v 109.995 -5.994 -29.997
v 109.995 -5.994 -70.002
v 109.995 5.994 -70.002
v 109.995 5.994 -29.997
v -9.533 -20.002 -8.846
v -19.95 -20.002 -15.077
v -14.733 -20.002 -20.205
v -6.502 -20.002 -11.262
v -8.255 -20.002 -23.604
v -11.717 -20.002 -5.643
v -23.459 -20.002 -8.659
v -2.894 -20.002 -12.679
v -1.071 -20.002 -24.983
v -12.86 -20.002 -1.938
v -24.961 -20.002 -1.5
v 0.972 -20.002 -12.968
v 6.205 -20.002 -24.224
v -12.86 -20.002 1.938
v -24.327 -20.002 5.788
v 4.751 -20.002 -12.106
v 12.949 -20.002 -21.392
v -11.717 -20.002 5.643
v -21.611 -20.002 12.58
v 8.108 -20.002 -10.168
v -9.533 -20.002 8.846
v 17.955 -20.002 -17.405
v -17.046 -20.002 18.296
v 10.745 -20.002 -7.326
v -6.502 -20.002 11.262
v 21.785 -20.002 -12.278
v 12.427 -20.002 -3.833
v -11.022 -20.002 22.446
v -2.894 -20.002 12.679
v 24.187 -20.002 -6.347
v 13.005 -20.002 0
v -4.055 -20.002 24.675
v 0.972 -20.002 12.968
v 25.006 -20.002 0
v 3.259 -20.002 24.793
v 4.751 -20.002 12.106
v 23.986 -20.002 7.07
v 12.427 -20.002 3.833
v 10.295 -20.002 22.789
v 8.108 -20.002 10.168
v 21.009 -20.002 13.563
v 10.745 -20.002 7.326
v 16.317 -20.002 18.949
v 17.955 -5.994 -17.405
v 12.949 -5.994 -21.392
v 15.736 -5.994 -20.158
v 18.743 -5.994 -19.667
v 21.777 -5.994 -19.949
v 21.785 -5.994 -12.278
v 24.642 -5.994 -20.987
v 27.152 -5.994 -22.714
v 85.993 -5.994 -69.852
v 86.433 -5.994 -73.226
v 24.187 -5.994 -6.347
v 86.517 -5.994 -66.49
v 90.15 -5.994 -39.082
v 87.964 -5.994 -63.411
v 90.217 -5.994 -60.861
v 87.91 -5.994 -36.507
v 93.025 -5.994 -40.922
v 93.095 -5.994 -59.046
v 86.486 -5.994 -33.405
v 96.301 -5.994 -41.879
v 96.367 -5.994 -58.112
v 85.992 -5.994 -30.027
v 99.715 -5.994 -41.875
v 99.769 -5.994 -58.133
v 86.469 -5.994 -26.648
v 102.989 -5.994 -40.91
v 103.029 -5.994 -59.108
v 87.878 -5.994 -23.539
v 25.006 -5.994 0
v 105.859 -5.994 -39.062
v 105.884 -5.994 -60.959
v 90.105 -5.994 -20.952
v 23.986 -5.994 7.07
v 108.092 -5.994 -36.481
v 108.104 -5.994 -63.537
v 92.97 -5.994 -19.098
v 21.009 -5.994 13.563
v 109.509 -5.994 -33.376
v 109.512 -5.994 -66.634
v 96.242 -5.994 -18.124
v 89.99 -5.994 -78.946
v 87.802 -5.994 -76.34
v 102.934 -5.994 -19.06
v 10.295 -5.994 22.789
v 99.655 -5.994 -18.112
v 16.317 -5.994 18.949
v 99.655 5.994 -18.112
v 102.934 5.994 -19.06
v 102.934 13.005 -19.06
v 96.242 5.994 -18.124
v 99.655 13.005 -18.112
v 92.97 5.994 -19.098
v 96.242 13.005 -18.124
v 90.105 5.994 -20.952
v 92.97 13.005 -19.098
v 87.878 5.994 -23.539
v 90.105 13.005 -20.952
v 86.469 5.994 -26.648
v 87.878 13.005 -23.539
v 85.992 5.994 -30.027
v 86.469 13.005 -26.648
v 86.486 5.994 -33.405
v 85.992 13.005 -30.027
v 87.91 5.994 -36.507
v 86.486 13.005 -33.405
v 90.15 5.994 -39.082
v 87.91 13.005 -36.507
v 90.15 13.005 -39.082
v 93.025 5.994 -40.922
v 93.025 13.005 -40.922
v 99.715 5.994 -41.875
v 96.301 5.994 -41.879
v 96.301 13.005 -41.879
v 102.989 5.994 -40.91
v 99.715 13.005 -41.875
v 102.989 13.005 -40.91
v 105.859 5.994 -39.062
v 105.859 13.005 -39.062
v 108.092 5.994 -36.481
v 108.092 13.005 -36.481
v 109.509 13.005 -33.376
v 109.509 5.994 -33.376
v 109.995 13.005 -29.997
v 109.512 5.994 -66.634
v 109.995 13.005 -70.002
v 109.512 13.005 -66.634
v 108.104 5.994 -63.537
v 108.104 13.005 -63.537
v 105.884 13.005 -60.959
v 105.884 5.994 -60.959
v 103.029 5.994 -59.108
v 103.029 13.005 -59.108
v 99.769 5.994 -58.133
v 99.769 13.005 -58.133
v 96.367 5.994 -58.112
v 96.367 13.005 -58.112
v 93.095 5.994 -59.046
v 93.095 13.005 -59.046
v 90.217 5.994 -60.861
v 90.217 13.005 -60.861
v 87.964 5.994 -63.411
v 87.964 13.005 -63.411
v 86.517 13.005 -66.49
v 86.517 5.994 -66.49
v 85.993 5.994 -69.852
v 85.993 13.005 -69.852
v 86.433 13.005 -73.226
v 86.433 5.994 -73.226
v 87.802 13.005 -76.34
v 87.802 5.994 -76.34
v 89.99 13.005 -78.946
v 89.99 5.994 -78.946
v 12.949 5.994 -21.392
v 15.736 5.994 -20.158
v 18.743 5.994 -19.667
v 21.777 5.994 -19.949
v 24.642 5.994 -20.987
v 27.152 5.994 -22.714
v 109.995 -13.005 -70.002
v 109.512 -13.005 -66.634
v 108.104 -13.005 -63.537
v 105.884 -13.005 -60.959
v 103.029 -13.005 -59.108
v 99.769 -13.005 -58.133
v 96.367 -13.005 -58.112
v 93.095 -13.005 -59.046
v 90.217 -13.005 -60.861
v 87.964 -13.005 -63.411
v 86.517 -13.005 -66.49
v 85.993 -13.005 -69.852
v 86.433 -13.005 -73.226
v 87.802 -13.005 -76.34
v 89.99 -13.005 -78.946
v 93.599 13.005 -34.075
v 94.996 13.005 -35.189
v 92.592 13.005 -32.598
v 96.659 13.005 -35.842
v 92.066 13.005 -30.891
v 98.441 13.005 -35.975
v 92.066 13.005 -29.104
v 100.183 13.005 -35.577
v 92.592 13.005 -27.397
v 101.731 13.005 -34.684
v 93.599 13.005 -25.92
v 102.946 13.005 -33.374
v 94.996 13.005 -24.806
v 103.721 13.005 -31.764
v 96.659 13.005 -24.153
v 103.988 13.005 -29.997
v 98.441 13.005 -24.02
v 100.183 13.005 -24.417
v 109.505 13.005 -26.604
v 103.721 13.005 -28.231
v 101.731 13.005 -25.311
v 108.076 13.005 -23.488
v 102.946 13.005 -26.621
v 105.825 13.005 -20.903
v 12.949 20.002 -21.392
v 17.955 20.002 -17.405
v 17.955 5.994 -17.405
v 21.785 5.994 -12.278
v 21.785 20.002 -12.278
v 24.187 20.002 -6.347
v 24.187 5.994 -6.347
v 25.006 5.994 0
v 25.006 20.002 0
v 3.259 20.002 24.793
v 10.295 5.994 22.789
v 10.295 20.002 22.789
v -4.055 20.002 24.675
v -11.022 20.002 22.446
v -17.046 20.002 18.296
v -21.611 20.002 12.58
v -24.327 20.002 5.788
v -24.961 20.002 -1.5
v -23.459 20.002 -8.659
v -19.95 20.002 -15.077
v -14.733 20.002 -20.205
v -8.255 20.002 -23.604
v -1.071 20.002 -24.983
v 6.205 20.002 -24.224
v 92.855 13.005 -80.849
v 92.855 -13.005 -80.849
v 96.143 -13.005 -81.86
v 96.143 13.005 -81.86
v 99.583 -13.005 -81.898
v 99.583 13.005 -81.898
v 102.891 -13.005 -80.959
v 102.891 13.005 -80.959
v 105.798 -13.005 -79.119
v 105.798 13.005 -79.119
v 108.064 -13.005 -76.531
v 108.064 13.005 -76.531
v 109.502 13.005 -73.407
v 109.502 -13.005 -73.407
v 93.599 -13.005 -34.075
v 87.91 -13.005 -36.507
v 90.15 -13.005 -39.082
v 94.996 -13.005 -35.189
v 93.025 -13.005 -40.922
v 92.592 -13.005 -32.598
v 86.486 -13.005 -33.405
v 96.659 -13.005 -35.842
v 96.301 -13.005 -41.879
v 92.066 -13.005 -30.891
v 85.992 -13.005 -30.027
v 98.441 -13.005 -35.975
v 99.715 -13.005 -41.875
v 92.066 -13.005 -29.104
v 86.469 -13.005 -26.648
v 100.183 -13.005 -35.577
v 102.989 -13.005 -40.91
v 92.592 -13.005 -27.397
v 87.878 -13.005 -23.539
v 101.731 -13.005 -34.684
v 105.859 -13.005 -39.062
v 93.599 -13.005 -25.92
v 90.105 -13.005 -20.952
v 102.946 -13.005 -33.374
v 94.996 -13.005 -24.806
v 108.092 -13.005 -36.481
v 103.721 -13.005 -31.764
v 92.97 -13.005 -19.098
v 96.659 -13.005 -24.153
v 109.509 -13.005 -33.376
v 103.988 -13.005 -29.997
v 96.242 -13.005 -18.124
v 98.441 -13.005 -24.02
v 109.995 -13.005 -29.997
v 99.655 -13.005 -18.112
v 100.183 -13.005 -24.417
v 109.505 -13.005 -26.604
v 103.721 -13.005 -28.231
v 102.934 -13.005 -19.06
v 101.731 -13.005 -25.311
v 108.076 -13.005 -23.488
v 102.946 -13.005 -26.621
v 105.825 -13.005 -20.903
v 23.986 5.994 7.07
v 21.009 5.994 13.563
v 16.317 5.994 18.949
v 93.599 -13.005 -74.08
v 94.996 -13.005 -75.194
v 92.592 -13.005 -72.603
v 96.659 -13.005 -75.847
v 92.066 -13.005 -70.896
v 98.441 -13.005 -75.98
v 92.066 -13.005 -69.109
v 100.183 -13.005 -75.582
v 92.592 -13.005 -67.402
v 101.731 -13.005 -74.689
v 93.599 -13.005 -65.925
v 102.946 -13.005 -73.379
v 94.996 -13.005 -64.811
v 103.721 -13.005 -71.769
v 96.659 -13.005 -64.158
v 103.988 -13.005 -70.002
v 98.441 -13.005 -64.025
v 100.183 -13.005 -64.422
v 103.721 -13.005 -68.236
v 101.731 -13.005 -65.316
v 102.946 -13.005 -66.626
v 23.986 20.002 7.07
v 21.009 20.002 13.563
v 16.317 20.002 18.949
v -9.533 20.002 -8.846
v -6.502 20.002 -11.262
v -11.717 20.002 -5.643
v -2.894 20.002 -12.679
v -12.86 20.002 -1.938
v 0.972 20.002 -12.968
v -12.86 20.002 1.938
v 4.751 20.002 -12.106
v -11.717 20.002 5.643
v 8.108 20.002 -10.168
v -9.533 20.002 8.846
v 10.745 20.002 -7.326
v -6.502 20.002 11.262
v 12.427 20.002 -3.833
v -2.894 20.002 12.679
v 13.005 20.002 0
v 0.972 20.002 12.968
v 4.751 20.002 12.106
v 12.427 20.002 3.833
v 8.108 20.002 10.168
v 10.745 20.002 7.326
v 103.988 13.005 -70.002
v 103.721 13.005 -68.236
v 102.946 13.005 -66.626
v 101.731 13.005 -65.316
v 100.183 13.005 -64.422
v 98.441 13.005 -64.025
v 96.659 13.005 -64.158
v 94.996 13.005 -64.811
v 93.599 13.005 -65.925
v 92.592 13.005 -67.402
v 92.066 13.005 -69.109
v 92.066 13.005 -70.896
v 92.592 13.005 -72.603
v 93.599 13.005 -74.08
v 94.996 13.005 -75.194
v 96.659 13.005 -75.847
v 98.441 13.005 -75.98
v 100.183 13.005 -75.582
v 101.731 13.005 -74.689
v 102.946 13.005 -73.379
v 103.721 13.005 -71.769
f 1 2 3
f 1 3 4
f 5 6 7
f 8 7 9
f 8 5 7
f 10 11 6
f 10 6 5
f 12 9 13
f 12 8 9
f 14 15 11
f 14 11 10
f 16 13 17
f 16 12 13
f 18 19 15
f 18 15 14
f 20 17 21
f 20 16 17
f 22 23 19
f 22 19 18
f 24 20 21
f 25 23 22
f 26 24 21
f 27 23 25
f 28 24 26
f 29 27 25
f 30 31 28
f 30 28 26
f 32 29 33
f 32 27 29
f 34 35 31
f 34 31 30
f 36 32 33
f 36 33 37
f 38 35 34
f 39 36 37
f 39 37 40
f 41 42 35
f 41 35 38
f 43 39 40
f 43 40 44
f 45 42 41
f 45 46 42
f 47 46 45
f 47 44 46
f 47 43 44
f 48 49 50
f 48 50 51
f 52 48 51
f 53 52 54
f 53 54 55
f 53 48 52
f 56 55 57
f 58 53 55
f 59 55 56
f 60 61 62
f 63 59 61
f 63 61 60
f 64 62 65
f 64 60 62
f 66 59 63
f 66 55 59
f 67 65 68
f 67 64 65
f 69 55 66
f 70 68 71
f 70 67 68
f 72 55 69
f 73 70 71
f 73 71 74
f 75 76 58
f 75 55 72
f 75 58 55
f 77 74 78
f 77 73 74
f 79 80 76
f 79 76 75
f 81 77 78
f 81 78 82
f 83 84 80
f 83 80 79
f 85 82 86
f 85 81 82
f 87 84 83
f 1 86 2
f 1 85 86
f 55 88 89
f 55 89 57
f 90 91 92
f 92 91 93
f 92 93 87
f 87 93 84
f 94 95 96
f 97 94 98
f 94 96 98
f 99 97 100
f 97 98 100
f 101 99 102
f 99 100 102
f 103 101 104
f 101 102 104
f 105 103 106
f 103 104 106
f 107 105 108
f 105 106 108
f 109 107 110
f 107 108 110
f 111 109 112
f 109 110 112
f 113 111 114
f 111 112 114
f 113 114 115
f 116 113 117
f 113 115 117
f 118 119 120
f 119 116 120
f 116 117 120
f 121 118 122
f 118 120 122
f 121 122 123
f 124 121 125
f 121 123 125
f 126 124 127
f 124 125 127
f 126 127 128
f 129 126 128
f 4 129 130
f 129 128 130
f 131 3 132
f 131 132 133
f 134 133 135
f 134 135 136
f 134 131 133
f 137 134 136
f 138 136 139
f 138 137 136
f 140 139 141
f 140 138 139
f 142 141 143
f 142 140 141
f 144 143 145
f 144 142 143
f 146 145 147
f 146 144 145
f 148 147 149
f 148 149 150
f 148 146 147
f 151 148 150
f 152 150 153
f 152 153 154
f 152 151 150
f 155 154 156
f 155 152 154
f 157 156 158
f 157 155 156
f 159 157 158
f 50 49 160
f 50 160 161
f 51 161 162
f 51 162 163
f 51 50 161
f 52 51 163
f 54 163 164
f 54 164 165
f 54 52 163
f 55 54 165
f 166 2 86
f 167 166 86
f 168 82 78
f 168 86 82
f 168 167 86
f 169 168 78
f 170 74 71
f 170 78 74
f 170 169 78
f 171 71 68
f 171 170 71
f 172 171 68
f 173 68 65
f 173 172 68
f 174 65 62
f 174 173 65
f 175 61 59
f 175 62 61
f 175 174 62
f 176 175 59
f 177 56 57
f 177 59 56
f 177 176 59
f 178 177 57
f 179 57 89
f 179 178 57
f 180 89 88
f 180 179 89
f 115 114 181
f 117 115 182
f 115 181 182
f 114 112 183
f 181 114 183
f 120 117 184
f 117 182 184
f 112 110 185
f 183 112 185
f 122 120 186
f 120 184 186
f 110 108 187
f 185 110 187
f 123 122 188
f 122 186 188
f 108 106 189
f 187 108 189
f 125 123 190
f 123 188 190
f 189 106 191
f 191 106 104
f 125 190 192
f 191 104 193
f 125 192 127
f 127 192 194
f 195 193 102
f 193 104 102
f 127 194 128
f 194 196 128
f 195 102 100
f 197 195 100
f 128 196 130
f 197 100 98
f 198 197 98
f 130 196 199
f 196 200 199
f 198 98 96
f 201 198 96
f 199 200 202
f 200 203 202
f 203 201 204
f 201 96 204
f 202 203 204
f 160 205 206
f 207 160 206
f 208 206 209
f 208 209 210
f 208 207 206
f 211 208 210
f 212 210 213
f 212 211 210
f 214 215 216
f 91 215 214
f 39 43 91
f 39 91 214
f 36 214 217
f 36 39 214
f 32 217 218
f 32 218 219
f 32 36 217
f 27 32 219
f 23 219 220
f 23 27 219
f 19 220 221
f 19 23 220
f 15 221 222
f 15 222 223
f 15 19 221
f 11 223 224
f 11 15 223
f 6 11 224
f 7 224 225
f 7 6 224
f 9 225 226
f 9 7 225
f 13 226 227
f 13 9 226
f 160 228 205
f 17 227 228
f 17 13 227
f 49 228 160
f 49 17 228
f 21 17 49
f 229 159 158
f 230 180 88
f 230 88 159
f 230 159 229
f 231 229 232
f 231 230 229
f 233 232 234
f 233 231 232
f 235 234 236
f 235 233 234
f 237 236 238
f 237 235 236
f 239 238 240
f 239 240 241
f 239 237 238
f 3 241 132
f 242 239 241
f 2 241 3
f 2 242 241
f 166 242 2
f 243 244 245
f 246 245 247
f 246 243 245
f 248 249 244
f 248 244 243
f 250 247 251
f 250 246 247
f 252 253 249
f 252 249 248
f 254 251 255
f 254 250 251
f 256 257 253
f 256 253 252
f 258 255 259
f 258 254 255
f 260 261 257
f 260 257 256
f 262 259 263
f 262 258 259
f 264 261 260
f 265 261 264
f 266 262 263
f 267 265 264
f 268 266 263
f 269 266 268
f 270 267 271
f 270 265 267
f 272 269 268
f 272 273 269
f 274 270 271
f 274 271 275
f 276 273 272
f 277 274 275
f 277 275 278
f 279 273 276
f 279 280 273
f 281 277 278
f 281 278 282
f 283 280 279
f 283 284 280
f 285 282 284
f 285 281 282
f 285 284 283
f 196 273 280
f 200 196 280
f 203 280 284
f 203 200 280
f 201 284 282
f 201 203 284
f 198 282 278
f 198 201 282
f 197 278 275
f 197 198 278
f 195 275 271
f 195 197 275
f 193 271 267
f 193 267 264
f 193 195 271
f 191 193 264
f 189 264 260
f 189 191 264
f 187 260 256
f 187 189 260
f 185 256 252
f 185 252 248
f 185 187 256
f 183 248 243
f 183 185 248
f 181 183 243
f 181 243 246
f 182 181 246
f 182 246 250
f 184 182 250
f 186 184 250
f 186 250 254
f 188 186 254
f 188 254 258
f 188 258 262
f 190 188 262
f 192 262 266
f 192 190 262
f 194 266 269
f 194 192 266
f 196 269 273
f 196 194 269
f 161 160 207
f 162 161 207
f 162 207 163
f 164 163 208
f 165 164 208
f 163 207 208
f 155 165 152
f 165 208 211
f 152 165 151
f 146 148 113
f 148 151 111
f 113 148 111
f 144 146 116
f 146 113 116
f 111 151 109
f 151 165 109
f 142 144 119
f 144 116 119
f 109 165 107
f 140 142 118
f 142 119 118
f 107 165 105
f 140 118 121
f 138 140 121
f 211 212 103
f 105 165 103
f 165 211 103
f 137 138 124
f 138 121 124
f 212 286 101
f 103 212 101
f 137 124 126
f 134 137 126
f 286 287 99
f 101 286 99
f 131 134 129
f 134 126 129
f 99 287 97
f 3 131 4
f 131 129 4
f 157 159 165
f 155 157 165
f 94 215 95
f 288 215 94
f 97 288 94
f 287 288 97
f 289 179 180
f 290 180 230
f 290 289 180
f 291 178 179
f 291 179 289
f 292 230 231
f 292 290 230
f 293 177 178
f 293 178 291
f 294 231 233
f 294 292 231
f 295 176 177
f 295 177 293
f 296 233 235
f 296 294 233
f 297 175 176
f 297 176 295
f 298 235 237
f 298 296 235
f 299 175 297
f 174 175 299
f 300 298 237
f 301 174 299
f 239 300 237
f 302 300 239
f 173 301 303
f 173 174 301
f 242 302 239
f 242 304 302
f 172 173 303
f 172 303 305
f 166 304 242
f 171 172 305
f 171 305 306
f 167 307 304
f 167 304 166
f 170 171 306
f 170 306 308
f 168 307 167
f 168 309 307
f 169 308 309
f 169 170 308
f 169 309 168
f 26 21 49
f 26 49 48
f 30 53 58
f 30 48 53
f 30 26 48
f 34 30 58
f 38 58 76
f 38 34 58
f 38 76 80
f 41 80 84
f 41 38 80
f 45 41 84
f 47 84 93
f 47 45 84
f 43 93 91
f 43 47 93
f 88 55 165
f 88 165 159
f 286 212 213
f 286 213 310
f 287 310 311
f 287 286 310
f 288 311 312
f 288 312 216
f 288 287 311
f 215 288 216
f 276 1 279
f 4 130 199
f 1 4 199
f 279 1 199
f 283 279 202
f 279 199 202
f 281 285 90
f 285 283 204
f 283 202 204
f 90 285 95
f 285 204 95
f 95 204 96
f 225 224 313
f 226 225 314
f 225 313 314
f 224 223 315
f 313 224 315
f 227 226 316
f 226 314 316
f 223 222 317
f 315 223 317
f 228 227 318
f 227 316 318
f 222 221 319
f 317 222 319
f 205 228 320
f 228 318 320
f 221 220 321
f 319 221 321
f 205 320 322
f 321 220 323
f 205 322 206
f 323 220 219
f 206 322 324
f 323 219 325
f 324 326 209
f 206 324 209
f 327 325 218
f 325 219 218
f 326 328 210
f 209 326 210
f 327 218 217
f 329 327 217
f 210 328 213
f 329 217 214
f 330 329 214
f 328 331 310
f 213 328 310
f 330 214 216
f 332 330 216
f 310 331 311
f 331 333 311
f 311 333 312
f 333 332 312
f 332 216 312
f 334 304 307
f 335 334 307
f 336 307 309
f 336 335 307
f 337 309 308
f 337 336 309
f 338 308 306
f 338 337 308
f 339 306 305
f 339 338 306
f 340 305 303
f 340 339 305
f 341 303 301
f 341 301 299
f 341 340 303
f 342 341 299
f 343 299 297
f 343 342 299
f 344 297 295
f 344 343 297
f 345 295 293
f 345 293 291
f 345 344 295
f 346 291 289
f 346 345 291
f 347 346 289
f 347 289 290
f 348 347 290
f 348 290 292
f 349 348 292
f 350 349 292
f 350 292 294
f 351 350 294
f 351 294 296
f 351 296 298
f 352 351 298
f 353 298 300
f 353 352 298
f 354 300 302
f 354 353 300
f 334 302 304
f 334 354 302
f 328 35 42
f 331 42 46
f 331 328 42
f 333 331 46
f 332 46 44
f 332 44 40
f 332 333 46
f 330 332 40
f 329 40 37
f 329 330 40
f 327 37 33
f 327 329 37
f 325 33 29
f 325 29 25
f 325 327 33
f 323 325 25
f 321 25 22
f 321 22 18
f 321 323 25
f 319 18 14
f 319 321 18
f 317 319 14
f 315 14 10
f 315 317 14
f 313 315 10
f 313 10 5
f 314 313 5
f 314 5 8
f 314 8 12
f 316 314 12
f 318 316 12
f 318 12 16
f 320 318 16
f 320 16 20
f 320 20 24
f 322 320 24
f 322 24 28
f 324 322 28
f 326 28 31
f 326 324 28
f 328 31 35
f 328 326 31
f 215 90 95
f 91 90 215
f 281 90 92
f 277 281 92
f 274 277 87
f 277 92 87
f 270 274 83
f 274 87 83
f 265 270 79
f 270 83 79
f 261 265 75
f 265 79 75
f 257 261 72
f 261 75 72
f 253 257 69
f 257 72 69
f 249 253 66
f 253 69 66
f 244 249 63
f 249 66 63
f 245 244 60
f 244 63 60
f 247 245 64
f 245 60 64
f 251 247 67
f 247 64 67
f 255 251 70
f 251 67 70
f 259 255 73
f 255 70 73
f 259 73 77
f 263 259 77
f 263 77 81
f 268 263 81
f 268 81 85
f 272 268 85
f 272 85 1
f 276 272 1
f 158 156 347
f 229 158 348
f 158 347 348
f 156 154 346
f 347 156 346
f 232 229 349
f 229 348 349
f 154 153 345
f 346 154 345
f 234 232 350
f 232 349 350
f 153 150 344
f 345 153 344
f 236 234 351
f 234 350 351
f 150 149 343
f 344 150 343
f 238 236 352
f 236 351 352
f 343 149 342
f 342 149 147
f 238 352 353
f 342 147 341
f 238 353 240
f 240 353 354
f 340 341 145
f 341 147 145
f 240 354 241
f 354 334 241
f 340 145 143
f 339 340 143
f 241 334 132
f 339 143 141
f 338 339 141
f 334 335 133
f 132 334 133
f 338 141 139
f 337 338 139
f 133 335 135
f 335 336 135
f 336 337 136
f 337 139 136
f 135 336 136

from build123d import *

# Parameters (mm, degrees)
F1_DEPTH = 5.9944
F0_R     = 13.0048
F2_DEPTH = 20.0025
F0_R_2   = 5.9944
F3_DEPTH = 13.0048


with BuildPart() as f1:
    # F0 (on Front) → F1 (new body, symmetric)
    with BuildSketch(Plane.XZ):
        with BuildLine():
            ThreePointArc((10.294693, 22.788908), (21.008894, 13.562501), (25.0063, 0))
            ThreePointArc((25.0063, 0), (21.784516, -12.278025), (12.949346, -21.392276))
            ThreePointArc((12.949346, -21.392276), (20.268898, -19.711211), (27.152389, -22.714435))
            Line((27.152389, -22.714435), (89.990008, -78.945829))
            ThreePointArc((89.990008, -78.945829), (93.09495, -59.045979), (109.9947, -70.0024))
            Line((109.9947, -70.0024), (109.9947, -29.9974))
            ThreePointArc((109.9947, -29.9974), (87.910211, -36.506574), (102.934025, -19.060113))
            Line((102.934025, -19.060113), (10.294693, 22.788908))
        make_face()
    extrude(amount=F1_DEPTH, both=True)

    # F0 (on Front) → F2 (join, symmetric)
    with BuildSketch(Plane.XZ):
        with BuildLine():
            ThreePointArc((12.949346, -21.392276), (21.784516, -12.278025), (25.0063, 0))
            ThreePointArc((25.0063, 0), (21.008894, 13.562501), (10.294693, 22.788908))
            ThreePointArc((10.294693, 22.788908), (-24.961282, -1.499814), (12.949346, -21.392276))
        make_face()
        Circle(F0_R, mode=Mode.SUBTRACT)
    extrude(amount=F2_DEPTH, both=True)

    # F0 (on Front) → F3 (join, symmetric)
    with BuildSketch(Plane.XZ):
        with BuildLine():
            ThreePointArc((109.9947, -29.9974), (108.076189, -23.488226), (102.934025, -19.060113))
            ThreePointArc((102.934025, -19.060113), (87.910211, -36.506574), (109.9947, -29.9974))
        make_face()
        with Locations((97.9932, -29.9974)):
            Circle(F0_R_2, mode=Mode.SUBTRACT)
        with BuildLine():
            ThreePointArc((109.9947, -70.0024), (93.09495, -59.045979), (89.990008, -78.945829))
            ThreePointArc((89.990008, -78.945829), (102.89145, -80.958821), (109.9947, -70.0024))
        make_face()
        with Locations((97.9932, -70.0024)):
            Circle(F0_R_2, mode=Mode.SUBTRACT)
    extrude(amount=F3_DEPTH, both=True)


solid = f1.part
